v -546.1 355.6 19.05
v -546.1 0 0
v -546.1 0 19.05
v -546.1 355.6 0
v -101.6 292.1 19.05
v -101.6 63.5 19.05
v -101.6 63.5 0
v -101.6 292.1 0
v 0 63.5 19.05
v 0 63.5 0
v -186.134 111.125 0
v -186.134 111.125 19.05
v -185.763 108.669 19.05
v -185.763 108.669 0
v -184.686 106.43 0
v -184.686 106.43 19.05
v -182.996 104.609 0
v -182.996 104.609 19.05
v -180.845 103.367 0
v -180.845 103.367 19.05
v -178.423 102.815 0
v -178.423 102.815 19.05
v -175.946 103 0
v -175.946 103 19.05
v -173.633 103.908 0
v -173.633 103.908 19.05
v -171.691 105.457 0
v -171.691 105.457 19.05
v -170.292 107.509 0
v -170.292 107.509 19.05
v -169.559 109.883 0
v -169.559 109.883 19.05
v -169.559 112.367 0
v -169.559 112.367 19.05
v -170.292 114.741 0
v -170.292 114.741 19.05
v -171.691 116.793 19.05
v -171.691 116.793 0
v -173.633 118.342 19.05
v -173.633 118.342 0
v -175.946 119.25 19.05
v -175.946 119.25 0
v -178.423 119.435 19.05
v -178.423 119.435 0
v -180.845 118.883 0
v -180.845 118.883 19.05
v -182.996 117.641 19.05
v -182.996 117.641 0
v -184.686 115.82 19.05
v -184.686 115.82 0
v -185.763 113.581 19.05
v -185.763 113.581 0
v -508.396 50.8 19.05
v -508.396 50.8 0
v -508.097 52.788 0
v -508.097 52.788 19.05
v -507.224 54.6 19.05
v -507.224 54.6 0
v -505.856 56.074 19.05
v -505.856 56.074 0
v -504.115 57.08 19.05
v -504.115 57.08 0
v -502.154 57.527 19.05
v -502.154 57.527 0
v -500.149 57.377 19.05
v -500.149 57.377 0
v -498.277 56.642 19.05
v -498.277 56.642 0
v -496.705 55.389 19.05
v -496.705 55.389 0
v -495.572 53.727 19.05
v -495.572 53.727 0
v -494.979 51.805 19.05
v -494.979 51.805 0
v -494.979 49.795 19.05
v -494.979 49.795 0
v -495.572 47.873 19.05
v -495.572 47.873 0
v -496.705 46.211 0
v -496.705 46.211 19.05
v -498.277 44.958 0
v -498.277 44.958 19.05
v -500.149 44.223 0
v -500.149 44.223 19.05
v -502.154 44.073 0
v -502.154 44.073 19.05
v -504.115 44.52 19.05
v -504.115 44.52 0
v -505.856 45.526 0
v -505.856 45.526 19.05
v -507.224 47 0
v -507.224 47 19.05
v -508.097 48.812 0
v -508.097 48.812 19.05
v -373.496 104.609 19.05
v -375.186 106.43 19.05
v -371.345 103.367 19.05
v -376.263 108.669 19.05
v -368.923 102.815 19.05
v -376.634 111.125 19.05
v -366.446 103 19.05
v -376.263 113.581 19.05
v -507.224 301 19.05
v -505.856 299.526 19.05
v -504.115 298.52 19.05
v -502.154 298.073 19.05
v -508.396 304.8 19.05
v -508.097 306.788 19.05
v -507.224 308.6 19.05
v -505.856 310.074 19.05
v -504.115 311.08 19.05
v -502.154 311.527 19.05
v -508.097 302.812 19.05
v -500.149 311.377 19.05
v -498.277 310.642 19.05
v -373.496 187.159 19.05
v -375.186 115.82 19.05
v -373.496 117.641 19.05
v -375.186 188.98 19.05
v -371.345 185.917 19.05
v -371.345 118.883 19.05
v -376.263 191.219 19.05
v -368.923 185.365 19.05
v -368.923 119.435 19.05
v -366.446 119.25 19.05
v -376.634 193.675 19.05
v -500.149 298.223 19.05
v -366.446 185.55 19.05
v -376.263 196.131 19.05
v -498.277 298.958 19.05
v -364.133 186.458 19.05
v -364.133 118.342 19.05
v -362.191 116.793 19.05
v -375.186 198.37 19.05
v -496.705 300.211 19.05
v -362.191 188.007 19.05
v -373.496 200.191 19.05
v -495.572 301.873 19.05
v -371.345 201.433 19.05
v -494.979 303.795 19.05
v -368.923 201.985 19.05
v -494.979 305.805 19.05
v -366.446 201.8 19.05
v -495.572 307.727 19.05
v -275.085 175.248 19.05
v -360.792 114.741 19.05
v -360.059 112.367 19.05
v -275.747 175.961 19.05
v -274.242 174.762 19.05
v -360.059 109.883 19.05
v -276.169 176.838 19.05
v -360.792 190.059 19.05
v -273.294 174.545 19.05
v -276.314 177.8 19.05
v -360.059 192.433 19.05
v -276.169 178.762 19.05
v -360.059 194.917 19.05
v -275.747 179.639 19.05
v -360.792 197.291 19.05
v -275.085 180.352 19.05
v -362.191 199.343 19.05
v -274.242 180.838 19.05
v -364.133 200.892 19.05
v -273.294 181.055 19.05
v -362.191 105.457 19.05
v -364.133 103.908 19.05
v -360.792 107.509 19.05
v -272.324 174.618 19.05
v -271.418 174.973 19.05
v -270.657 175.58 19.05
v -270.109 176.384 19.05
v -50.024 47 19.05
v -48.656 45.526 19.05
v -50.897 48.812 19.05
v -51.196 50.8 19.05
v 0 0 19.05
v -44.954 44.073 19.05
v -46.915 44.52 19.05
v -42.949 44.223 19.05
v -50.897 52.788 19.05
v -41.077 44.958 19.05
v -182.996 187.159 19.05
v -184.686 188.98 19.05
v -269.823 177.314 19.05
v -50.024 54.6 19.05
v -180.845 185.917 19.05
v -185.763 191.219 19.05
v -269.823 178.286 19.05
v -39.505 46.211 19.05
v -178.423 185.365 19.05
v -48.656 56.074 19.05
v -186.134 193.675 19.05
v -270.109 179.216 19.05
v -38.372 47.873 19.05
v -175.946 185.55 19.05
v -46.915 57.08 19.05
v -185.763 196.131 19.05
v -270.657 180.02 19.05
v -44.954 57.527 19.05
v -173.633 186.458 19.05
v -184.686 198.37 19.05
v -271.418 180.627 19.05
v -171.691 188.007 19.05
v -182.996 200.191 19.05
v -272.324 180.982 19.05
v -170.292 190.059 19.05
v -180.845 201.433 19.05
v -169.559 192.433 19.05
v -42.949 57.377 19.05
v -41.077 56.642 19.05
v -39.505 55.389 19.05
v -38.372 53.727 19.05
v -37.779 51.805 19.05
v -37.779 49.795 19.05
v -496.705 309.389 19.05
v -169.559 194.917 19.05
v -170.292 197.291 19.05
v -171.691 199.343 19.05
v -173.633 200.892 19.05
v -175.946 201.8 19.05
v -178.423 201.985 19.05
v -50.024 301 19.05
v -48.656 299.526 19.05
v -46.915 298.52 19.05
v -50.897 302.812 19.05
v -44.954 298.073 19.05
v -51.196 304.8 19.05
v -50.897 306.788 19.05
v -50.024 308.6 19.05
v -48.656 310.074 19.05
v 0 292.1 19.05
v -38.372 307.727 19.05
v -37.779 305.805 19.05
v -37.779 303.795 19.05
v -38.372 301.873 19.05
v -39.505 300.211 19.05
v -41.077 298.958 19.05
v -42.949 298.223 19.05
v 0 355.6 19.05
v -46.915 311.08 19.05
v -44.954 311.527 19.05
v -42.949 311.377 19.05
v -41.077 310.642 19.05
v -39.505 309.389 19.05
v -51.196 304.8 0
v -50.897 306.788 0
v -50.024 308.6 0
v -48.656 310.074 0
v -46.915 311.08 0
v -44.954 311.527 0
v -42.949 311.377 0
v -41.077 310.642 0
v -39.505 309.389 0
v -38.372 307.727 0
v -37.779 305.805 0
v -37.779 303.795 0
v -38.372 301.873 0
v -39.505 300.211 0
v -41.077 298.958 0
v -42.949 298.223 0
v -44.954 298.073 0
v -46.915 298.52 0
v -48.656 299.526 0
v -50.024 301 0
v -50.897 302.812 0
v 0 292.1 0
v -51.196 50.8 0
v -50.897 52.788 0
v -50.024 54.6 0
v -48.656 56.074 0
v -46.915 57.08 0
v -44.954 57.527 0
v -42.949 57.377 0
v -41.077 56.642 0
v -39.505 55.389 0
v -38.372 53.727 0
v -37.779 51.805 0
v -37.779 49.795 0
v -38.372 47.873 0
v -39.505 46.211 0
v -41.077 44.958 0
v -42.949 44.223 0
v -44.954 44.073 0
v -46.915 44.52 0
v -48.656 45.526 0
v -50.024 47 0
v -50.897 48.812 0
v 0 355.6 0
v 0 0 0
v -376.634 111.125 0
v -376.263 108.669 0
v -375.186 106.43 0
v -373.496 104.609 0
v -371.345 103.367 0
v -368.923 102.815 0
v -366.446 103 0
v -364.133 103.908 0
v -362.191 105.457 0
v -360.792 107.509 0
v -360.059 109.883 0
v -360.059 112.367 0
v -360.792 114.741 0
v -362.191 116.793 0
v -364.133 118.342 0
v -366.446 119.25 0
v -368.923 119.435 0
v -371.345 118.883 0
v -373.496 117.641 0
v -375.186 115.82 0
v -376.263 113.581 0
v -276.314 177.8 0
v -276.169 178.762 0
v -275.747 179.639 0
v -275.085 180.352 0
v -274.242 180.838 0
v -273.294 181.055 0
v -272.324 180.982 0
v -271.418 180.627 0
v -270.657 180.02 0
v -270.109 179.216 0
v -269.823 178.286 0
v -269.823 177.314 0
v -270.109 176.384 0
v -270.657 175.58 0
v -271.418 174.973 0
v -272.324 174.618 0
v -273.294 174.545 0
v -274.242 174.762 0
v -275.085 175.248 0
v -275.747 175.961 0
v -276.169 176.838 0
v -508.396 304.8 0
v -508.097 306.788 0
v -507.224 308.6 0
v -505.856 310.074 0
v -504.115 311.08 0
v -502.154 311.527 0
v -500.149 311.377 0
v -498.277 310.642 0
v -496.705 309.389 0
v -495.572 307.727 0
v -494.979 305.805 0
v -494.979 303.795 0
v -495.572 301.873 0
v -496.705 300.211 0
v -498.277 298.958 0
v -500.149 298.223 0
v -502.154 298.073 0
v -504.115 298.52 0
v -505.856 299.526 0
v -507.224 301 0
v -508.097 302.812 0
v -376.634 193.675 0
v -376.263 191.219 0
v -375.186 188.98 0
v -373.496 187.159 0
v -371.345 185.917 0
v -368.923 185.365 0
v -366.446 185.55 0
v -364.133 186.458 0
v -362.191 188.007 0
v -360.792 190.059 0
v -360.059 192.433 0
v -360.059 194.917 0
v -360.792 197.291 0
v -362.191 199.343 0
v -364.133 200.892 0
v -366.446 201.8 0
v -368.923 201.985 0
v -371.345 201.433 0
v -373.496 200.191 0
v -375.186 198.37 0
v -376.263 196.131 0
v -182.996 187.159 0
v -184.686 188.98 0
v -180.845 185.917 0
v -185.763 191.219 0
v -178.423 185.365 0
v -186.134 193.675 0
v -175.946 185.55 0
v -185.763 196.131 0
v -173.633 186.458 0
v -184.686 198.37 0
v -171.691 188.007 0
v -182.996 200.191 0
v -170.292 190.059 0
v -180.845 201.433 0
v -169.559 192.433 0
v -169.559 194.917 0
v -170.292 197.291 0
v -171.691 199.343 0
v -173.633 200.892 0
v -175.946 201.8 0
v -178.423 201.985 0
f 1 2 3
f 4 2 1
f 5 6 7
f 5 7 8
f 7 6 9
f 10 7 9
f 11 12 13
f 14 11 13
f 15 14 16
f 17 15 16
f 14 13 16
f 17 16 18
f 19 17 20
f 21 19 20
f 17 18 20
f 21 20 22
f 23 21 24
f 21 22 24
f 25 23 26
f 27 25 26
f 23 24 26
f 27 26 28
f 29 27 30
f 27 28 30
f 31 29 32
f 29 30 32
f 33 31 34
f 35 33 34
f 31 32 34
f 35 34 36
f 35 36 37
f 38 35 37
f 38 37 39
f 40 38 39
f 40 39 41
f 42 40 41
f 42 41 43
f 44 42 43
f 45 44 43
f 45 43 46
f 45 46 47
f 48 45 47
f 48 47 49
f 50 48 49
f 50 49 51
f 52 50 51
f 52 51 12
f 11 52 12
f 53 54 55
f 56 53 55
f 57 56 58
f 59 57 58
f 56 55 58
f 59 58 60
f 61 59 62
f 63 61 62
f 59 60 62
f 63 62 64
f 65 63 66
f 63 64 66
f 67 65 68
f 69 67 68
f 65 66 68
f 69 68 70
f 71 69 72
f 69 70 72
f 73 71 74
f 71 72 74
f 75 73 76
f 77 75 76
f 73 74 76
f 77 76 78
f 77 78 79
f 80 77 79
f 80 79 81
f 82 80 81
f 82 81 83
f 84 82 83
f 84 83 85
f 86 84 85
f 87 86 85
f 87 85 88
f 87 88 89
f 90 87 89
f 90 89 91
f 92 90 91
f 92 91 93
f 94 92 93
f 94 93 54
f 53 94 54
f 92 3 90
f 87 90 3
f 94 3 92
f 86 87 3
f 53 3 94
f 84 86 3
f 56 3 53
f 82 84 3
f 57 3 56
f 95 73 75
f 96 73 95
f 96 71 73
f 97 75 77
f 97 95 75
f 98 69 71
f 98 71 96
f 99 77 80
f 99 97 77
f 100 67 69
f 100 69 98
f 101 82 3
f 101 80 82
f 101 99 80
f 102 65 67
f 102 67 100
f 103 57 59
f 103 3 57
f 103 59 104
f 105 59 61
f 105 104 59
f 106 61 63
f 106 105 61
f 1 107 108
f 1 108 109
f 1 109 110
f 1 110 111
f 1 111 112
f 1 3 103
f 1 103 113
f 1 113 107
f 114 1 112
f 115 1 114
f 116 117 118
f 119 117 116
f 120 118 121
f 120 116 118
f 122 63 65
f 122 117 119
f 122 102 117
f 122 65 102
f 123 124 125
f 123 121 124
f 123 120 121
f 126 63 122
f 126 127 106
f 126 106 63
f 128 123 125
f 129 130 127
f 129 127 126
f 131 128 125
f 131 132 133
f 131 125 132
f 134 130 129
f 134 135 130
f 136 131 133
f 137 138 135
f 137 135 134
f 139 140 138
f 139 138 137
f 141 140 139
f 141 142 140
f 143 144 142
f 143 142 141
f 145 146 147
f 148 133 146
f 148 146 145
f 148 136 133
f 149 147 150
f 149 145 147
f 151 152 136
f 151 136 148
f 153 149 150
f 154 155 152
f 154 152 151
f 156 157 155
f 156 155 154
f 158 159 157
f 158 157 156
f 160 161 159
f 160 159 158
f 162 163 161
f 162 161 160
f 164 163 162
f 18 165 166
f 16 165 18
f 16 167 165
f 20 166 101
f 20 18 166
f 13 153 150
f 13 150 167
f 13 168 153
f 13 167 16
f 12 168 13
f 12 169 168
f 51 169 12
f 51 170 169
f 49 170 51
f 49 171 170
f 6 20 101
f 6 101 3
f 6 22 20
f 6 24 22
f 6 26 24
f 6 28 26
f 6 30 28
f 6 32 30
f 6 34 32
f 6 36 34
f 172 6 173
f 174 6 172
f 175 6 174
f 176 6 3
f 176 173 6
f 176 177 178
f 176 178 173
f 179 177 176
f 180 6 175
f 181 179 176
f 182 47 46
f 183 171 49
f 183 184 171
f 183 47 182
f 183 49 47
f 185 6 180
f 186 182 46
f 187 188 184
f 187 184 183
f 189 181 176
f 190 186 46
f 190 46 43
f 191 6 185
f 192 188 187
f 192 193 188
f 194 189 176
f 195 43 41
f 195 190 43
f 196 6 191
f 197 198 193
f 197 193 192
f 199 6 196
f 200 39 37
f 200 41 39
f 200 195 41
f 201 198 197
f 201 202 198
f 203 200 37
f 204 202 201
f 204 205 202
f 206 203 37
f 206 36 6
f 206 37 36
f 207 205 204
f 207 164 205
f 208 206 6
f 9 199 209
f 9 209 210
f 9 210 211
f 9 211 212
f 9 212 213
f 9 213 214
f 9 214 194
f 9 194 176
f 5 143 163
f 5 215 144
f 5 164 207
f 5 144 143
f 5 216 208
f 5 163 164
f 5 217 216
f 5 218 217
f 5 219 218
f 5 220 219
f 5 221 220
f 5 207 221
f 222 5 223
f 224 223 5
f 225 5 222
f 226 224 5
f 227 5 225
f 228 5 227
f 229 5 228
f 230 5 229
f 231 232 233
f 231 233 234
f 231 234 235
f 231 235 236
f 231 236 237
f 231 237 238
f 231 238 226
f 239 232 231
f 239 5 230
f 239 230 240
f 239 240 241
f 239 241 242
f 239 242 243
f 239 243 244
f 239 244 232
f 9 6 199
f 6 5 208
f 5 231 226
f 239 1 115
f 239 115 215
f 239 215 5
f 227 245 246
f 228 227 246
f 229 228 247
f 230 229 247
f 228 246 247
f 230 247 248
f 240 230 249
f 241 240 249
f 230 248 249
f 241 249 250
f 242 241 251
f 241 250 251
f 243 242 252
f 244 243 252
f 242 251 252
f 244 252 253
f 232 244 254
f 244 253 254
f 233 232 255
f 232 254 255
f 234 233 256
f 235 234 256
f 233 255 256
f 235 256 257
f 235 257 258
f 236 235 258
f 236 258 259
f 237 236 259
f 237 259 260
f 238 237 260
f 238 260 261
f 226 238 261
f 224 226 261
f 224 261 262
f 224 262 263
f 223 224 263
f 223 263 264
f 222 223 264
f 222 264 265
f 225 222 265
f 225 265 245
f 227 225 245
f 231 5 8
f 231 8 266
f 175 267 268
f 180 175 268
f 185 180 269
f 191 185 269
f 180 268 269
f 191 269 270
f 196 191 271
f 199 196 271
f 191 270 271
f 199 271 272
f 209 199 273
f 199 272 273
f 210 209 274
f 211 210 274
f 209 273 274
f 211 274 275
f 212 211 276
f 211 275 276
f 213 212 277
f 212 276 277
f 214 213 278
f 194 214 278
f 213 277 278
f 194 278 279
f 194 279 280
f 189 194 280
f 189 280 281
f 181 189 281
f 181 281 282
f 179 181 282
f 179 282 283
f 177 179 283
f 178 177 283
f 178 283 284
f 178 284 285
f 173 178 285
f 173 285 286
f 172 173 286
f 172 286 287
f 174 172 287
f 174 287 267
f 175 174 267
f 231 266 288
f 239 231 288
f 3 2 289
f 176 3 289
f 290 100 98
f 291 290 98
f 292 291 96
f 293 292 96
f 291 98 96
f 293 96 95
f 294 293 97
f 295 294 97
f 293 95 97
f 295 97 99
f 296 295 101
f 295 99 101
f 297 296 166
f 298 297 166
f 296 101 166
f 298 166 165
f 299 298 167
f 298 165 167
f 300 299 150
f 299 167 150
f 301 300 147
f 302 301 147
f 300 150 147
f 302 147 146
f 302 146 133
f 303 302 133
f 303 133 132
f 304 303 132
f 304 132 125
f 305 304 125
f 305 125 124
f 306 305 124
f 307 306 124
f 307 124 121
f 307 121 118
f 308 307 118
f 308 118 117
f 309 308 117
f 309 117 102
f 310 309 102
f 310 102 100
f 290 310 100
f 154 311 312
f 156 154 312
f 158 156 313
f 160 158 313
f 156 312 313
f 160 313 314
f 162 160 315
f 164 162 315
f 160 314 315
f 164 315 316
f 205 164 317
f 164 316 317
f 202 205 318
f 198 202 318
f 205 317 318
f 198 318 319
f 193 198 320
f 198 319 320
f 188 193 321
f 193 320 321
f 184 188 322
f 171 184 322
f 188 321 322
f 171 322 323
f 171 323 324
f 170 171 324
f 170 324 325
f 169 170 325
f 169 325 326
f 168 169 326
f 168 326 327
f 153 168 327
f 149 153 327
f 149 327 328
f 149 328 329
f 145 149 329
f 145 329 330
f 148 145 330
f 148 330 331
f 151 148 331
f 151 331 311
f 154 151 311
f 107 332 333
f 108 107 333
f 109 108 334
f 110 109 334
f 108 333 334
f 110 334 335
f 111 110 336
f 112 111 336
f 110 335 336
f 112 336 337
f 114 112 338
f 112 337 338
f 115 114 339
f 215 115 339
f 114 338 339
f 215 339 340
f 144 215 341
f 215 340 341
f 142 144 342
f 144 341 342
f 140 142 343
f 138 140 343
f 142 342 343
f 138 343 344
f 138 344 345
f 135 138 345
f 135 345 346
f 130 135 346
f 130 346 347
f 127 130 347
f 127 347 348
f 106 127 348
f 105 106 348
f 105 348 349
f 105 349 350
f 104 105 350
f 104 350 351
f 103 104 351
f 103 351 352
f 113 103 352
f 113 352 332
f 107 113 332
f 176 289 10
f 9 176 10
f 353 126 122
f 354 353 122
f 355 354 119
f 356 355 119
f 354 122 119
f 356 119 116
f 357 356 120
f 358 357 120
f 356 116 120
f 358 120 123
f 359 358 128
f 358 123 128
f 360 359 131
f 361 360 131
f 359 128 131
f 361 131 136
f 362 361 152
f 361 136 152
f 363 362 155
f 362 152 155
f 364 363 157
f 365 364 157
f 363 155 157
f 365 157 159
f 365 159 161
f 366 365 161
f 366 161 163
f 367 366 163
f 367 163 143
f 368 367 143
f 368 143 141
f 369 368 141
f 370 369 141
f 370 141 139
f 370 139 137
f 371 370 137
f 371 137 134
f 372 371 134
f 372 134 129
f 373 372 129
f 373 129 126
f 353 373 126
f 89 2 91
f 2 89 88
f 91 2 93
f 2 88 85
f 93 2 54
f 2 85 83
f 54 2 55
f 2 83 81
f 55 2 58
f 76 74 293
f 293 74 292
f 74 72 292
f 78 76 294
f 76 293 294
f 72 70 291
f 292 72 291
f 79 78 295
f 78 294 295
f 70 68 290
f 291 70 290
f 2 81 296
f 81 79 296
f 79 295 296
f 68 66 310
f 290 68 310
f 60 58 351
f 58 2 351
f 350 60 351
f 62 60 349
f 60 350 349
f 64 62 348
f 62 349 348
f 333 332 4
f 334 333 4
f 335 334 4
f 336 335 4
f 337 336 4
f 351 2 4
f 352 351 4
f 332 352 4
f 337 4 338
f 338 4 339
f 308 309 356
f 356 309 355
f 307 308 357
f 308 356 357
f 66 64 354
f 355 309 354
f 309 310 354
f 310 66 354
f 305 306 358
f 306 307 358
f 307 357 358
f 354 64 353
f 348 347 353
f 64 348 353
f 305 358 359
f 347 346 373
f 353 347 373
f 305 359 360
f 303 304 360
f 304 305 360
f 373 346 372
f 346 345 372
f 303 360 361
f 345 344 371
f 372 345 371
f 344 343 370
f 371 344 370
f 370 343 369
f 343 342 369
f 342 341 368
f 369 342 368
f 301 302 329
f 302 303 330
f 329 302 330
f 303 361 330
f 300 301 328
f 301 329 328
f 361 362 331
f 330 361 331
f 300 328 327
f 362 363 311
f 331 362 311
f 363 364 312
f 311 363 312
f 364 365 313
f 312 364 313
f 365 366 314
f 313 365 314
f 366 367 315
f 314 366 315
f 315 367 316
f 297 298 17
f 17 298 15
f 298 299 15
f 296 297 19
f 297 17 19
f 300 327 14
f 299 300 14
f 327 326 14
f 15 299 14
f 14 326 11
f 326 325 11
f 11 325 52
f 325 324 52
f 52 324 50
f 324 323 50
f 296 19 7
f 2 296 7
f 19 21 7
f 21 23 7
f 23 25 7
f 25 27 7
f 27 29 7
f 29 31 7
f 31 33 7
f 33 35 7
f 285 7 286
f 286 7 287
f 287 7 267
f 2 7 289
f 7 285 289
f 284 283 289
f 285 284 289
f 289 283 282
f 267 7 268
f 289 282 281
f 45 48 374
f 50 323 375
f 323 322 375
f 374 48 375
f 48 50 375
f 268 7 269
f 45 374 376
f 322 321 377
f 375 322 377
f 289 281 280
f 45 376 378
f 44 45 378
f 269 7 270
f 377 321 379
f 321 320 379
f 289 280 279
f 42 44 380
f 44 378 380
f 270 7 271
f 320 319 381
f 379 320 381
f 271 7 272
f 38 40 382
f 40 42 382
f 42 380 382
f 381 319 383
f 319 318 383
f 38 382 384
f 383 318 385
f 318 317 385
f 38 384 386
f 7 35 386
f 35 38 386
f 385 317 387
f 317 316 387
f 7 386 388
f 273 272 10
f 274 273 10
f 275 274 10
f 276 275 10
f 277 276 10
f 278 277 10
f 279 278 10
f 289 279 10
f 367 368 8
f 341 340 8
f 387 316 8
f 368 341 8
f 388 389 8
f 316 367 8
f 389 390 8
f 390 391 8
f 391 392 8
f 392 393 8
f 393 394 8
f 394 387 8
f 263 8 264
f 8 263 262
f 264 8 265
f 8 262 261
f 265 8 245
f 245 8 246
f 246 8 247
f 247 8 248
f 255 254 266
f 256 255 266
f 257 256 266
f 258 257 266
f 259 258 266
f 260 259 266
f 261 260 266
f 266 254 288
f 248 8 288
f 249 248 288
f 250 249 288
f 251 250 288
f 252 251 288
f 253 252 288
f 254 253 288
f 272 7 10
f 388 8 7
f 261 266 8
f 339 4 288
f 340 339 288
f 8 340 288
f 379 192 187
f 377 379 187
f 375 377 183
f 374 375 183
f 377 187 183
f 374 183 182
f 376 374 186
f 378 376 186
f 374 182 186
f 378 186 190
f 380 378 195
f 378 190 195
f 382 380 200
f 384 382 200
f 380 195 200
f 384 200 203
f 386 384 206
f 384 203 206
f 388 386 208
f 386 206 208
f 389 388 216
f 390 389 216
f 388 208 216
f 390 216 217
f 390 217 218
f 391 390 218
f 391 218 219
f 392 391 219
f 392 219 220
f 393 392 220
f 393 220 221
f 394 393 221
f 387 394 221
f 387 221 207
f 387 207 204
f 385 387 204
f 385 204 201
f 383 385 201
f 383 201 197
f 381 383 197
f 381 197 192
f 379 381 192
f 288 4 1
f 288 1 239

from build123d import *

# Parameters (mm, degrees)
F0_W     = 546.1
F0_H     = 355.6
F1_DEPTH = 19.05
F3_D     = 13.49248
F4_W     = 101.6
F4_H     = 228.6
F5_DEPTH = 19.05
F8_D     = 6.5278
F10_D    = 16.66748


with BuildPart() as f1:
    # F0 (on Top) → F1 (new body)
    with BuildSketch(Plane.XY):
        with Locations((-273.05, 177.8)):
            Rectangle(F0_W, F0_H)
    extrude(amount=F1_DEPTH)

    # F3 (through all)
    with Locations(Plane.XY.offset(19.05)):
        with Locations((-501.65, 304.8), (-44.45, 304.8), (-44.45, 50.8), (-501.65, 50.8)):
            Hole(F3_D / 2)

    # F4 (on face) → F5 (cut)
    with BuildSketch(Plane.XY.offset(19.05)):
        with Locations((-50.8, 177.8)):
            Rectangle(F4_W, F4_H)
    extrude(amount=-F5_DEPTH, mode=Mode.SUBTRACT)

    # F8 (through all)
    with Locations(Plane.XY.offset(19.05)):
        with Locations((-273.05, 177.8)):
            Hole(F8_D / 2)

    # F10 (through all)
    with Locations(Plane(origin=(0, 0, 0), x_dir=(1, 0, 0), z_dir=(0, 0, -1))):
        with Locations((-177.8, -193.675), (-368.3, -193.675), (-368.3, -111.125), (-177.8, -111.125)):
            Hole(F10_D / 2)


solid = f1.part
